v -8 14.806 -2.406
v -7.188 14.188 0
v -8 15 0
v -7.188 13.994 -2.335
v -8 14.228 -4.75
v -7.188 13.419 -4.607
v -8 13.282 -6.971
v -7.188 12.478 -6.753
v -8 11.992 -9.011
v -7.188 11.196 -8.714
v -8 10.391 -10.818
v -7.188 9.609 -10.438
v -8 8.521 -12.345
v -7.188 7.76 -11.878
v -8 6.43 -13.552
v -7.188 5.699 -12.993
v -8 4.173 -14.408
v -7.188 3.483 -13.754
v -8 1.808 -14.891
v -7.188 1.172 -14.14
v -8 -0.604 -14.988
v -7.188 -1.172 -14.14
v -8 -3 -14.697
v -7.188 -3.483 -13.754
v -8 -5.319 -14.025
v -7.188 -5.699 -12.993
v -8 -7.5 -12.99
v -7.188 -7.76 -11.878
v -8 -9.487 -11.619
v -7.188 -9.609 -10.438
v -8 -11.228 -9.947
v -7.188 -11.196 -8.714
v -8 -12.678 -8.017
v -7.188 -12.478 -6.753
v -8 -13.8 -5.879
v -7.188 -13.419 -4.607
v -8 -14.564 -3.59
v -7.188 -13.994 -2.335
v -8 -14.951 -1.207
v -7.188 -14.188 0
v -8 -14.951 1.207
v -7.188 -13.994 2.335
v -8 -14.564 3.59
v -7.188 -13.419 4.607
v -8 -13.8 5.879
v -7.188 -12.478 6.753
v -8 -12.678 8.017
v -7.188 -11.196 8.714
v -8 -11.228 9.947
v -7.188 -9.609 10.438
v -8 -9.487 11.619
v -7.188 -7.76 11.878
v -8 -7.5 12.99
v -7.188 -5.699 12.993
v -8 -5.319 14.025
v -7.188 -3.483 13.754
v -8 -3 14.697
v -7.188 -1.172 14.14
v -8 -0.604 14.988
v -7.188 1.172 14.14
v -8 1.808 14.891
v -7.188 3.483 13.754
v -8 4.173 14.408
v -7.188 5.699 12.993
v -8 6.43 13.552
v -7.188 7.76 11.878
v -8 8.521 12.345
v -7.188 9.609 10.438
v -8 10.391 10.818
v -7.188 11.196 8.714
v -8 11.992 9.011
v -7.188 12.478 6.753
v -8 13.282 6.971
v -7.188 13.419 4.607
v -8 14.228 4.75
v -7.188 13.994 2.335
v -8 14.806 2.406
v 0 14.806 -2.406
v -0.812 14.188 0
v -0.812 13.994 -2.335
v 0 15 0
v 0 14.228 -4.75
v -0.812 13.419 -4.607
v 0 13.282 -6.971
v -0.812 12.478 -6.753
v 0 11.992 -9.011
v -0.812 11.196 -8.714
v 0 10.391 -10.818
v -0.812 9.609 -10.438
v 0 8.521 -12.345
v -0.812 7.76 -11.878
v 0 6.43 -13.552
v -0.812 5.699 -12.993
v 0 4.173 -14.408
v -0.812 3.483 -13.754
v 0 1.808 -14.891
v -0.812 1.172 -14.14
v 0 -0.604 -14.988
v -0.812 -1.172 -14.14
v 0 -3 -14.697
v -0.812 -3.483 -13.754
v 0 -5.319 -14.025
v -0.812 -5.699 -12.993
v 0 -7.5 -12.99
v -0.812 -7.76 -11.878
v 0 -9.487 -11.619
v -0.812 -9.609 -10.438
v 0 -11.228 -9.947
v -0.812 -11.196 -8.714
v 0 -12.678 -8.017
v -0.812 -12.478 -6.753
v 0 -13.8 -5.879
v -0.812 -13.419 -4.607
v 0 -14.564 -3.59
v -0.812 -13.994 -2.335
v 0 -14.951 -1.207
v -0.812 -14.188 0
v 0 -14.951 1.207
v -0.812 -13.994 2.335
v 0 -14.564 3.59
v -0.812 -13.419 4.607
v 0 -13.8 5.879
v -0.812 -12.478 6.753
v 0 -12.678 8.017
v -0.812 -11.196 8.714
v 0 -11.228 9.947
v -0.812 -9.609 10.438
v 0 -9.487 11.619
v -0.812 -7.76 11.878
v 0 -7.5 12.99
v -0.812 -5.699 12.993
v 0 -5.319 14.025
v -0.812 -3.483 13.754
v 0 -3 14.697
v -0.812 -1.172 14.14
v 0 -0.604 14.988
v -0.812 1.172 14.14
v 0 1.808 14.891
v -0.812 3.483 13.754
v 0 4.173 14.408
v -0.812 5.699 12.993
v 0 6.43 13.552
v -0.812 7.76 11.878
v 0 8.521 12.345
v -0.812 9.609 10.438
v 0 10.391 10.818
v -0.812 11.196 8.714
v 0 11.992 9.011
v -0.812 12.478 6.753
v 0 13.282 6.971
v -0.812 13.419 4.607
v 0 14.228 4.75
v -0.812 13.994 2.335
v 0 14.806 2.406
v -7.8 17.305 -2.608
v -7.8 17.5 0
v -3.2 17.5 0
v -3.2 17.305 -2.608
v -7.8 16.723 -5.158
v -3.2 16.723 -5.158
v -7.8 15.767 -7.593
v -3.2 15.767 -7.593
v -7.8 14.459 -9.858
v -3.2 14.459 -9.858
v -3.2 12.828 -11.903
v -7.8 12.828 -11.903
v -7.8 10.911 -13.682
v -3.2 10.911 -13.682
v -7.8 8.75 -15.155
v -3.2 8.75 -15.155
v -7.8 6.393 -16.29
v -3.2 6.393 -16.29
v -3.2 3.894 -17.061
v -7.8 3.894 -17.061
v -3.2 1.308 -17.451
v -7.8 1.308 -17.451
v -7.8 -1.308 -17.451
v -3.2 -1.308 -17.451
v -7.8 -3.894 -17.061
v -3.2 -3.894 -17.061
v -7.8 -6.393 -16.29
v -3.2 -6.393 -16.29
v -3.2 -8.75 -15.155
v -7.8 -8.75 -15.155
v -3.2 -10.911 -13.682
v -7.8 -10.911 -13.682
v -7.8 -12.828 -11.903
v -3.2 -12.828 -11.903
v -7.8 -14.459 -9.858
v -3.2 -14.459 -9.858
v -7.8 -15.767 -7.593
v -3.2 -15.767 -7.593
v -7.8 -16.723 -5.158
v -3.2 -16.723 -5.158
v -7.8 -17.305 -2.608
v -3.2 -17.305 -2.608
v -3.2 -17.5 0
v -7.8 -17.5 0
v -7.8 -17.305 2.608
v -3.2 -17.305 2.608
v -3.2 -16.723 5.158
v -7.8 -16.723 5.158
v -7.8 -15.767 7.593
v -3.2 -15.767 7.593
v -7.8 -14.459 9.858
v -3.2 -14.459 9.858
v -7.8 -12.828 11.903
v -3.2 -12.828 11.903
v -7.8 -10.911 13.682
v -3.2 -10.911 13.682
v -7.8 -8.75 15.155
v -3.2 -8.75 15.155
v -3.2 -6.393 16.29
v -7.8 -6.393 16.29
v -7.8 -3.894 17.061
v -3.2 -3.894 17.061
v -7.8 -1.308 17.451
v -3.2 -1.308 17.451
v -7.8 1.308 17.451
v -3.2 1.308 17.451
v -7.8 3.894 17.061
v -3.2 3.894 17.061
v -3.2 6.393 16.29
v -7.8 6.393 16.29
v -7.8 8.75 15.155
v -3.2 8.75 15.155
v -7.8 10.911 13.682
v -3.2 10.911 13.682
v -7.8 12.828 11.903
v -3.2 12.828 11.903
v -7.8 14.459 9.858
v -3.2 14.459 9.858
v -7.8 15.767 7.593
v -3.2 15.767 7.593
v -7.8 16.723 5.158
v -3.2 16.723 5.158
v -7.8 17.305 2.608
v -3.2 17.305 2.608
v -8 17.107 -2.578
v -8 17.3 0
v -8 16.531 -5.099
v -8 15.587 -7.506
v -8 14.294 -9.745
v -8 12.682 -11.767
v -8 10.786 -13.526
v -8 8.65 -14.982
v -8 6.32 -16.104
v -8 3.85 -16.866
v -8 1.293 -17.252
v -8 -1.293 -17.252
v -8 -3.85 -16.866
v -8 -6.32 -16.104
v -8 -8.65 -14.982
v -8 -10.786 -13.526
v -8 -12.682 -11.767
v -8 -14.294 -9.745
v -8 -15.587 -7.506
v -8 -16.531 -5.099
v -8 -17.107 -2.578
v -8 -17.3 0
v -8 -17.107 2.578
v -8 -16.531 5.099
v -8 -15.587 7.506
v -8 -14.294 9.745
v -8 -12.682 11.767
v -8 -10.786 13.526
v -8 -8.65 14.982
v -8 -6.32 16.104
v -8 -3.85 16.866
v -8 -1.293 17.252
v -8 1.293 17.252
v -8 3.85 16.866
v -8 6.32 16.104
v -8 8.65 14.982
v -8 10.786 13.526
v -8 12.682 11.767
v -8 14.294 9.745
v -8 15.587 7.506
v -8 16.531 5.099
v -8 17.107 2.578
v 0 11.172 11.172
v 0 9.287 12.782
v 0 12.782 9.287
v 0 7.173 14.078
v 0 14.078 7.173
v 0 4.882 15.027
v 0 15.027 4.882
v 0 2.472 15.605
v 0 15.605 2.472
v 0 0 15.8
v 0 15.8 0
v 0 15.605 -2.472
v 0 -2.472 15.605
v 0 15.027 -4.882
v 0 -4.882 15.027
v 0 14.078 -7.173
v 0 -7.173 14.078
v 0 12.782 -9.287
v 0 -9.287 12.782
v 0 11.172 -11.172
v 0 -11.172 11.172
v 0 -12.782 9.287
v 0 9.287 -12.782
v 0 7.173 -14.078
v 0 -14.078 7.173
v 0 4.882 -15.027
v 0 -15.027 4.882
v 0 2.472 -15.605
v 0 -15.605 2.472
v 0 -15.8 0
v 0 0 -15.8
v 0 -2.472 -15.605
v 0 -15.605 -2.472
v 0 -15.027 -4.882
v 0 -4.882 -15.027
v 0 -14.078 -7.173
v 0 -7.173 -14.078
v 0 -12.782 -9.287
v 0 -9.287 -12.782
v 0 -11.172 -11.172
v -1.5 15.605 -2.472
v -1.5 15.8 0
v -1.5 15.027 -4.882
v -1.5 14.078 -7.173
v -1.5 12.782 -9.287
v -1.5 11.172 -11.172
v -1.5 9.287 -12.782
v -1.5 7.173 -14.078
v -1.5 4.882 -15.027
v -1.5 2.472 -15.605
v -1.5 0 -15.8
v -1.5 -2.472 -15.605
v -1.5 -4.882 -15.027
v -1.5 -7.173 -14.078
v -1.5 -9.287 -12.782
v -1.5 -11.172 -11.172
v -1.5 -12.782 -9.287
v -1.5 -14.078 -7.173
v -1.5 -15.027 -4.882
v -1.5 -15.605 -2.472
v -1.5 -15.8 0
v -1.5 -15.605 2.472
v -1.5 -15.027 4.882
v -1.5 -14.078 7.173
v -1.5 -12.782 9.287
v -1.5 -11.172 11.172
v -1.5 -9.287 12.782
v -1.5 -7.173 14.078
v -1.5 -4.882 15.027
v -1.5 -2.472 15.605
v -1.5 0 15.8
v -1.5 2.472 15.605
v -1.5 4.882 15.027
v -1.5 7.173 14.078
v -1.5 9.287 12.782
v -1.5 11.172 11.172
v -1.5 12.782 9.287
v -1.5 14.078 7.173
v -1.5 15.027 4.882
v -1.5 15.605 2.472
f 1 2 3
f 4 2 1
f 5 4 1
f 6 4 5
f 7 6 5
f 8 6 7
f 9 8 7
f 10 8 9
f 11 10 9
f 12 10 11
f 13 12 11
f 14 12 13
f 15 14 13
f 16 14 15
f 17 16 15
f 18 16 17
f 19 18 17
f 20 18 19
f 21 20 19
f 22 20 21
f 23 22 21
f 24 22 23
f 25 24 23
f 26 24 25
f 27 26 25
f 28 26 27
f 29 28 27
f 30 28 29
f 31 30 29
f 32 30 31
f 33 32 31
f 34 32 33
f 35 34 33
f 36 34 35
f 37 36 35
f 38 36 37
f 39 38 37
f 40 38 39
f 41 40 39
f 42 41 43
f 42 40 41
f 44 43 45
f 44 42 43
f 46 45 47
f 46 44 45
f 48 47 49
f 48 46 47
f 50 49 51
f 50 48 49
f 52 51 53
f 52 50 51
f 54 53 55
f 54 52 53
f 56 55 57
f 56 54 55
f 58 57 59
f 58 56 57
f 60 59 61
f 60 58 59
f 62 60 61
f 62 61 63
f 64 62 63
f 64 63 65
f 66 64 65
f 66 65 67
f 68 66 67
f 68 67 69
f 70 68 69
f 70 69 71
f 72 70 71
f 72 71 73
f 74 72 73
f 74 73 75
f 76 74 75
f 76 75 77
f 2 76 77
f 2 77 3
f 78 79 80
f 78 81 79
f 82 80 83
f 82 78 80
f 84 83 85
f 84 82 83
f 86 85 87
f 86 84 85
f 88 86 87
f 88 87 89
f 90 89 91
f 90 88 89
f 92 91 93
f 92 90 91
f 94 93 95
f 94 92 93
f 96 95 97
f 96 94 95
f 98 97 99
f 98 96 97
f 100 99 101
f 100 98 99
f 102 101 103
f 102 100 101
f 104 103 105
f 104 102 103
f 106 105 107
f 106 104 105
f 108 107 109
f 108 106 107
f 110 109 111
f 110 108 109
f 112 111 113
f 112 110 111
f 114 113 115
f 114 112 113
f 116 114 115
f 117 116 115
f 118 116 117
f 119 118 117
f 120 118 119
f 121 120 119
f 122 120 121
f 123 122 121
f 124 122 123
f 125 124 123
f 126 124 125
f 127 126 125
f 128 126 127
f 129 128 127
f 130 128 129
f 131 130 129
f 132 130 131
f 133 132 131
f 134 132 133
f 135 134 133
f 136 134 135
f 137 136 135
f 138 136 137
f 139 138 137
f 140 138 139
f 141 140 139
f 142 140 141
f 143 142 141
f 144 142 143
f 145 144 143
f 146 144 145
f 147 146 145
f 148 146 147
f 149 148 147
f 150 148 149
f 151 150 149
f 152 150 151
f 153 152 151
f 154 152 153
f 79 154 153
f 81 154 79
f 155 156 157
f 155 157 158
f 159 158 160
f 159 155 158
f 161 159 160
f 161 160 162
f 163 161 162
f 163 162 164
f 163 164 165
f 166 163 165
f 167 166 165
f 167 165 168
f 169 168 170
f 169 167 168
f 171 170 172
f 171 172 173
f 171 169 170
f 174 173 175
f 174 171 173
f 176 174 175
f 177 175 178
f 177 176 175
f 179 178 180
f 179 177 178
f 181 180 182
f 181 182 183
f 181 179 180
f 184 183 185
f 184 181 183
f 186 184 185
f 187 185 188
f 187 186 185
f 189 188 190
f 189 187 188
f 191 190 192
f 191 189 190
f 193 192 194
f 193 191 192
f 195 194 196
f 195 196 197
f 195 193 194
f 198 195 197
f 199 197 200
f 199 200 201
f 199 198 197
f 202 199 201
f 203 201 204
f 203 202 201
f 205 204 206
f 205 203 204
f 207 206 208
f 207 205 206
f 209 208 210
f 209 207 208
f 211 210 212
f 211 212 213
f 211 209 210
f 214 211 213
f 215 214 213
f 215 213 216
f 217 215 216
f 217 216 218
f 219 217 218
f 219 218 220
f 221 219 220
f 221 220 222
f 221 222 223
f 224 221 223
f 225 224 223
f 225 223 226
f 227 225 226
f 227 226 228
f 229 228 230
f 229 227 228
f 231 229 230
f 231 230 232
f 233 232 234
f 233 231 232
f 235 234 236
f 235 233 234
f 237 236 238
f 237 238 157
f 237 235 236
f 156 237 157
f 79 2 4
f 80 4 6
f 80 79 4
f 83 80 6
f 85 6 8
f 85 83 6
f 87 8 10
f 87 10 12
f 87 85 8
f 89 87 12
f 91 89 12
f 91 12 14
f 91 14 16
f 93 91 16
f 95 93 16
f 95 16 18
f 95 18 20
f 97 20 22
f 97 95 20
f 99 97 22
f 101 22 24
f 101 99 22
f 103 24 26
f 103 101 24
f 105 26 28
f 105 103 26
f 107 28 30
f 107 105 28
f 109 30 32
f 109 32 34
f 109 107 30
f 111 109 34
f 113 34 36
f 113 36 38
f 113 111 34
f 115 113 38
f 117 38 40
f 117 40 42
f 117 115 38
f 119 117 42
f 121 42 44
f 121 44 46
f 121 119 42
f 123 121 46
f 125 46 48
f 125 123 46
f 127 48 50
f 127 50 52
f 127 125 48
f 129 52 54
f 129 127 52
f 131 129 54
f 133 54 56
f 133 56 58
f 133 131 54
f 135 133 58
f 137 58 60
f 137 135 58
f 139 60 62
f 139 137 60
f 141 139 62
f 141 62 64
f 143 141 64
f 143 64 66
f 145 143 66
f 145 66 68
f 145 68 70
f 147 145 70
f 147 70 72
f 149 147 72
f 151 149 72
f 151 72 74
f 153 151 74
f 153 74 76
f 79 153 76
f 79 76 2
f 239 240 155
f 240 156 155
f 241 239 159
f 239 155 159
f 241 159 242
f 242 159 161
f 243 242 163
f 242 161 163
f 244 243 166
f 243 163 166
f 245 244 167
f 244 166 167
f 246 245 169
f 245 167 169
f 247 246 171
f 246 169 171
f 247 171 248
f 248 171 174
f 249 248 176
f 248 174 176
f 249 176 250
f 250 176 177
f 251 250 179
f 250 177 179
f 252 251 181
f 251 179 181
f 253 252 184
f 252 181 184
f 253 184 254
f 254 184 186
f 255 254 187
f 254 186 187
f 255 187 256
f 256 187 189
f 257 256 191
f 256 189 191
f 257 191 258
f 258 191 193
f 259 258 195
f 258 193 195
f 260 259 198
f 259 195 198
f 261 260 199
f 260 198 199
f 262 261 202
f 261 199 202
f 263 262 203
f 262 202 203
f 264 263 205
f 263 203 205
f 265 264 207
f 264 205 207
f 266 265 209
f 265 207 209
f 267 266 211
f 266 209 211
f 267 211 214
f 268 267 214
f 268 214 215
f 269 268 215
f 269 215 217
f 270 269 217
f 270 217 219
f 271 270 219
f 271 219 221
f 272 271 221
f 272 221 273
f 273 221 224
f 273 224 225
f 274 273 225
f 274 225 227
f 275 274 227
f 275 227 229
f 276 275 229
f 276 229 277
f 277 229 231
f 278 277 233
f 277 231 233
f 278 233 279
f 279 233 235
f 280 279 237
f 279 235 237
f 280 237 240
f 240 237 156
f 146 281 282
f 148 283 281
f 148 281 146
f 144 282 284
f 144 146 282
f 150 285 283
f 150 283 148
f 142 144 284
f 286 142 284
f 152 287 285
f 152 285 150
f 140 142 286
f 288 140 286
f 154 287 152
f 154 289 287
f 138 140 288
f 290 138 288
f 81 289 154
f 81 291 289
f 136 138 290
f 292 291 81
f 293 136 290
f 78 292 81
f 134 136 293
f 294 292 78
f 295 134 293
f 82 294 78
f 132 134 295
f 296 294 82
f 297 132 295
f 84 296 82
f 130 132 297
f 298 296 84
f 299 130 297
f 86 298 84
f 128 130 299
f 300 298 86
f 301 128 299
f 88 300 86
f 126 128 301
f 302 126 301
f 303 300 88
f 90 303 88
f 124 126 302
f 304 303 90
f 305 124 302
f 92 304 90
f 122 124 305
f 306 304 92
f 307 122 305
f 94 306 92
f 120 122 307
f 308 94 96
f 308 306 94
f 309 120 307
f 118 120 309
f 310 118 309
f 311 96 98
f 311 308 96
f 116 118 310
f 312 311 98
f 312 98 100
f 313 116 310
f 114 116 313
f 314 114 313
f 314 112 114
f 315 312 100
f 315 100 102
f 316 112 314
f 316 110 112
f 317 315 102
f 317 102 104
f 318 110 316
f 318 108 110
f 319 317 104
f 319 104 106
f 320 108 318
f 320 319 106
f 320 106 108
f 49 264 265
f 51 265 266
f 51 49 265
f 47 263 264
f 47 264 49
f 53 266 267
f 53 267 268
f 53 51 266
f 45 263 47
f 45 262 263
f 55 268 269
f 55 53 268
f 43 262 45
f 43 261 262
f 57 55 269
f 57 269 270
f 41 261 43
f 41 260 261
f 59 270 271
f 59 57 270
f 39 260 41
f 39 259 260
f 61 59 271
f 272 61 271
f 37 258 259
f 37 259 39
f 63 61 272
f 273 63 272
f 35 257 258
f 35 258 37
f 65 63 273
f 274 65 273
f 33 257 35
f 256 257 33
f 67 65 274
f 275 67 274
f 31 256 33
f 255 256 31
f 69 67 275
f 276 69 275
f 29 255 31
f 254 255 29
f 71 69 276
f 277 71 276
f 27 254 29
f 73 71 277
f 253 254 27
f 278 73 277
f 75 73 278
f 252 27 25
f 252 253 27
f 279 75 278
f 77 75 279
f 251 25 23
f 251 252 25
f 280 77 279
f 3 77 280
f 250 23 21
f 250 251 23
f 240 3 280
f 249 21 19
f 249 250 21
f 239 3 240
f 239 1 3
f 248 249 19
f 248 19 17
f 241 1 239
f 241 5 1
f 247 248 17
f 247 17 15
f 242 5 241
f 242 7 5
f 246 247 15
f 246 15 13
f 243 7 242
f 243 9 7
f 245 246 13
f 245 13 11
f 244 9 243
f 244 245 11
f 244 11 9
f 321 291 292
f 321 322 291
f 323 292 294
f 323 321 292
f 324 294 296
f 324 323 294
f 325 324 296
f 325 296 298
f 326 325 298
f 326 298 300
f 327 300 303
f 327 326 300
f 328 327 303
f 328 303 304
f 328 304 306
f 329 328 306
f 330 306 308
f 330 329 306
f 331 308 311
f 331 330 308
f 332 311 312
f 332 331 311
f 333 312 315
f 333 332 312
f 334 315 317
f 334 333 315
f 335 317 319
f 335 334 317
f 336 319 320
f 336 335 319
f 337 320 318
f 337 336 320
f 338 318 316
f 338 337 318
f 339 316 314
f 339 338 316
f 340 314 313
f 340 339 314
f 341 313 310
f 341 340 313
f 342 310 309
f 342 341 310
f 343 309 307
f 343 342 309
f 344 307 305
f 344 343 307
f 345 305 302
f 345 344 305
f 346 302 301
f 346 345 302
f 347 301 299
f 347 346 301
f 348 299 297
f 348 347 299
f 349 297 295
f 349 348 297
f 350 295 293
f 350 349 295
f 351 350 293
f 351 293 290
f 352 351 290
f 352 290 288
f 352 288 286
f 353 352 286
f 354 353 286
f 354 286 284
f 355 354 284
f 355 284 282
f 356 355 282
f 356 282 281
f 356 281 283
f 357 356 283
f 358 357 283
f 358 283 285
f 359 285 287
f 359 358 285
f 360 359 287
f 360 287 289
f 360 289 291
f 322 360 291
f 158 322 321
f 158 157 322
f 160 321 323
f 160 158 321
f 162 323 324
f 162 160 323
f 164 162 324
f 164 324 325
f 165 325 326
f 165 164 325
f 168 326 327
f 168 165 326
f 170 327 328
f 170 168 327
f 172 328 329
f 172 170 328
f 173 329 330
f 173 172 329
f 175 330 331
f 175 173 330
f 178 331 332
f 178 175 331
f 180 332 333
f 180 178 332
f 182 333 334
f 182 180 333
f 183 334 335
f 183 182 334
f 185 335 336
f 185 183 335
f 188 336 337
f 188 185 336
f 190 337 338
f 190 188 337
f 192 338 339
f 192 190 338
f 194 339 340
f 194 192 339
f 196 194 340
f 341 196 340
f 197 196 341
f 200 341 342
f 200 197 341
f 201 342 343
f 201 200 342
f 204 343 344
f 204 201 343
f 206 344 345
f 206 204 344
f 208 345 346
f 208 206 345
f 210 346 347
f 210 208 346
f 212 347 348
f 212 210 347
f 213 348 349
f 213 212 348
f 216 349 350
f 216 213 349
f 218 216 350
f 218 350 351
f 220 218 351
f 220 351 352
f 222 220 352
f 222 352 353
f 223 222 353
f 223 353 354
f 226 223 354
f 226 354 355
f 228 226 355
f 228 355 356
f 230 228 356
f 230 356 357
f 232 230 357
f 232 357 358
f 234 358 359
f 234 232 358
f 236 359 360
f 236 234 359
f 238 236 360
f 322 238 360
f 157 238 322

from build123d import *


with BuildPart() as part:
    # Sketch1 → Revolve1 (revolve)
    with BuildSketch(Plane.XY):
        Polygon((-8, 17.5), (-8, 15), (-7.188, 14.188), (-0.812, 14.188), (0, 15), (0, 15.8), (-1.5, 15.8), (-3.2, 17.5), align=None)
    revolve(axis=Axis((50, 0, 0), (-1, 0, 0)))

    # Sketch2 → Cut-Revolve1 (revolve, cut)
    with BuildSketch(Plane.XY):
        Polygon((-8, 17.3), (-7.8, 17.5), (0, 17.5), (0, 20), (-8, 20), align=None)
    revolve(axis=Axis((50, 0, 0), (-1, 0, 0)), mode=Mode.SUBTRACT)


solid = part.part
